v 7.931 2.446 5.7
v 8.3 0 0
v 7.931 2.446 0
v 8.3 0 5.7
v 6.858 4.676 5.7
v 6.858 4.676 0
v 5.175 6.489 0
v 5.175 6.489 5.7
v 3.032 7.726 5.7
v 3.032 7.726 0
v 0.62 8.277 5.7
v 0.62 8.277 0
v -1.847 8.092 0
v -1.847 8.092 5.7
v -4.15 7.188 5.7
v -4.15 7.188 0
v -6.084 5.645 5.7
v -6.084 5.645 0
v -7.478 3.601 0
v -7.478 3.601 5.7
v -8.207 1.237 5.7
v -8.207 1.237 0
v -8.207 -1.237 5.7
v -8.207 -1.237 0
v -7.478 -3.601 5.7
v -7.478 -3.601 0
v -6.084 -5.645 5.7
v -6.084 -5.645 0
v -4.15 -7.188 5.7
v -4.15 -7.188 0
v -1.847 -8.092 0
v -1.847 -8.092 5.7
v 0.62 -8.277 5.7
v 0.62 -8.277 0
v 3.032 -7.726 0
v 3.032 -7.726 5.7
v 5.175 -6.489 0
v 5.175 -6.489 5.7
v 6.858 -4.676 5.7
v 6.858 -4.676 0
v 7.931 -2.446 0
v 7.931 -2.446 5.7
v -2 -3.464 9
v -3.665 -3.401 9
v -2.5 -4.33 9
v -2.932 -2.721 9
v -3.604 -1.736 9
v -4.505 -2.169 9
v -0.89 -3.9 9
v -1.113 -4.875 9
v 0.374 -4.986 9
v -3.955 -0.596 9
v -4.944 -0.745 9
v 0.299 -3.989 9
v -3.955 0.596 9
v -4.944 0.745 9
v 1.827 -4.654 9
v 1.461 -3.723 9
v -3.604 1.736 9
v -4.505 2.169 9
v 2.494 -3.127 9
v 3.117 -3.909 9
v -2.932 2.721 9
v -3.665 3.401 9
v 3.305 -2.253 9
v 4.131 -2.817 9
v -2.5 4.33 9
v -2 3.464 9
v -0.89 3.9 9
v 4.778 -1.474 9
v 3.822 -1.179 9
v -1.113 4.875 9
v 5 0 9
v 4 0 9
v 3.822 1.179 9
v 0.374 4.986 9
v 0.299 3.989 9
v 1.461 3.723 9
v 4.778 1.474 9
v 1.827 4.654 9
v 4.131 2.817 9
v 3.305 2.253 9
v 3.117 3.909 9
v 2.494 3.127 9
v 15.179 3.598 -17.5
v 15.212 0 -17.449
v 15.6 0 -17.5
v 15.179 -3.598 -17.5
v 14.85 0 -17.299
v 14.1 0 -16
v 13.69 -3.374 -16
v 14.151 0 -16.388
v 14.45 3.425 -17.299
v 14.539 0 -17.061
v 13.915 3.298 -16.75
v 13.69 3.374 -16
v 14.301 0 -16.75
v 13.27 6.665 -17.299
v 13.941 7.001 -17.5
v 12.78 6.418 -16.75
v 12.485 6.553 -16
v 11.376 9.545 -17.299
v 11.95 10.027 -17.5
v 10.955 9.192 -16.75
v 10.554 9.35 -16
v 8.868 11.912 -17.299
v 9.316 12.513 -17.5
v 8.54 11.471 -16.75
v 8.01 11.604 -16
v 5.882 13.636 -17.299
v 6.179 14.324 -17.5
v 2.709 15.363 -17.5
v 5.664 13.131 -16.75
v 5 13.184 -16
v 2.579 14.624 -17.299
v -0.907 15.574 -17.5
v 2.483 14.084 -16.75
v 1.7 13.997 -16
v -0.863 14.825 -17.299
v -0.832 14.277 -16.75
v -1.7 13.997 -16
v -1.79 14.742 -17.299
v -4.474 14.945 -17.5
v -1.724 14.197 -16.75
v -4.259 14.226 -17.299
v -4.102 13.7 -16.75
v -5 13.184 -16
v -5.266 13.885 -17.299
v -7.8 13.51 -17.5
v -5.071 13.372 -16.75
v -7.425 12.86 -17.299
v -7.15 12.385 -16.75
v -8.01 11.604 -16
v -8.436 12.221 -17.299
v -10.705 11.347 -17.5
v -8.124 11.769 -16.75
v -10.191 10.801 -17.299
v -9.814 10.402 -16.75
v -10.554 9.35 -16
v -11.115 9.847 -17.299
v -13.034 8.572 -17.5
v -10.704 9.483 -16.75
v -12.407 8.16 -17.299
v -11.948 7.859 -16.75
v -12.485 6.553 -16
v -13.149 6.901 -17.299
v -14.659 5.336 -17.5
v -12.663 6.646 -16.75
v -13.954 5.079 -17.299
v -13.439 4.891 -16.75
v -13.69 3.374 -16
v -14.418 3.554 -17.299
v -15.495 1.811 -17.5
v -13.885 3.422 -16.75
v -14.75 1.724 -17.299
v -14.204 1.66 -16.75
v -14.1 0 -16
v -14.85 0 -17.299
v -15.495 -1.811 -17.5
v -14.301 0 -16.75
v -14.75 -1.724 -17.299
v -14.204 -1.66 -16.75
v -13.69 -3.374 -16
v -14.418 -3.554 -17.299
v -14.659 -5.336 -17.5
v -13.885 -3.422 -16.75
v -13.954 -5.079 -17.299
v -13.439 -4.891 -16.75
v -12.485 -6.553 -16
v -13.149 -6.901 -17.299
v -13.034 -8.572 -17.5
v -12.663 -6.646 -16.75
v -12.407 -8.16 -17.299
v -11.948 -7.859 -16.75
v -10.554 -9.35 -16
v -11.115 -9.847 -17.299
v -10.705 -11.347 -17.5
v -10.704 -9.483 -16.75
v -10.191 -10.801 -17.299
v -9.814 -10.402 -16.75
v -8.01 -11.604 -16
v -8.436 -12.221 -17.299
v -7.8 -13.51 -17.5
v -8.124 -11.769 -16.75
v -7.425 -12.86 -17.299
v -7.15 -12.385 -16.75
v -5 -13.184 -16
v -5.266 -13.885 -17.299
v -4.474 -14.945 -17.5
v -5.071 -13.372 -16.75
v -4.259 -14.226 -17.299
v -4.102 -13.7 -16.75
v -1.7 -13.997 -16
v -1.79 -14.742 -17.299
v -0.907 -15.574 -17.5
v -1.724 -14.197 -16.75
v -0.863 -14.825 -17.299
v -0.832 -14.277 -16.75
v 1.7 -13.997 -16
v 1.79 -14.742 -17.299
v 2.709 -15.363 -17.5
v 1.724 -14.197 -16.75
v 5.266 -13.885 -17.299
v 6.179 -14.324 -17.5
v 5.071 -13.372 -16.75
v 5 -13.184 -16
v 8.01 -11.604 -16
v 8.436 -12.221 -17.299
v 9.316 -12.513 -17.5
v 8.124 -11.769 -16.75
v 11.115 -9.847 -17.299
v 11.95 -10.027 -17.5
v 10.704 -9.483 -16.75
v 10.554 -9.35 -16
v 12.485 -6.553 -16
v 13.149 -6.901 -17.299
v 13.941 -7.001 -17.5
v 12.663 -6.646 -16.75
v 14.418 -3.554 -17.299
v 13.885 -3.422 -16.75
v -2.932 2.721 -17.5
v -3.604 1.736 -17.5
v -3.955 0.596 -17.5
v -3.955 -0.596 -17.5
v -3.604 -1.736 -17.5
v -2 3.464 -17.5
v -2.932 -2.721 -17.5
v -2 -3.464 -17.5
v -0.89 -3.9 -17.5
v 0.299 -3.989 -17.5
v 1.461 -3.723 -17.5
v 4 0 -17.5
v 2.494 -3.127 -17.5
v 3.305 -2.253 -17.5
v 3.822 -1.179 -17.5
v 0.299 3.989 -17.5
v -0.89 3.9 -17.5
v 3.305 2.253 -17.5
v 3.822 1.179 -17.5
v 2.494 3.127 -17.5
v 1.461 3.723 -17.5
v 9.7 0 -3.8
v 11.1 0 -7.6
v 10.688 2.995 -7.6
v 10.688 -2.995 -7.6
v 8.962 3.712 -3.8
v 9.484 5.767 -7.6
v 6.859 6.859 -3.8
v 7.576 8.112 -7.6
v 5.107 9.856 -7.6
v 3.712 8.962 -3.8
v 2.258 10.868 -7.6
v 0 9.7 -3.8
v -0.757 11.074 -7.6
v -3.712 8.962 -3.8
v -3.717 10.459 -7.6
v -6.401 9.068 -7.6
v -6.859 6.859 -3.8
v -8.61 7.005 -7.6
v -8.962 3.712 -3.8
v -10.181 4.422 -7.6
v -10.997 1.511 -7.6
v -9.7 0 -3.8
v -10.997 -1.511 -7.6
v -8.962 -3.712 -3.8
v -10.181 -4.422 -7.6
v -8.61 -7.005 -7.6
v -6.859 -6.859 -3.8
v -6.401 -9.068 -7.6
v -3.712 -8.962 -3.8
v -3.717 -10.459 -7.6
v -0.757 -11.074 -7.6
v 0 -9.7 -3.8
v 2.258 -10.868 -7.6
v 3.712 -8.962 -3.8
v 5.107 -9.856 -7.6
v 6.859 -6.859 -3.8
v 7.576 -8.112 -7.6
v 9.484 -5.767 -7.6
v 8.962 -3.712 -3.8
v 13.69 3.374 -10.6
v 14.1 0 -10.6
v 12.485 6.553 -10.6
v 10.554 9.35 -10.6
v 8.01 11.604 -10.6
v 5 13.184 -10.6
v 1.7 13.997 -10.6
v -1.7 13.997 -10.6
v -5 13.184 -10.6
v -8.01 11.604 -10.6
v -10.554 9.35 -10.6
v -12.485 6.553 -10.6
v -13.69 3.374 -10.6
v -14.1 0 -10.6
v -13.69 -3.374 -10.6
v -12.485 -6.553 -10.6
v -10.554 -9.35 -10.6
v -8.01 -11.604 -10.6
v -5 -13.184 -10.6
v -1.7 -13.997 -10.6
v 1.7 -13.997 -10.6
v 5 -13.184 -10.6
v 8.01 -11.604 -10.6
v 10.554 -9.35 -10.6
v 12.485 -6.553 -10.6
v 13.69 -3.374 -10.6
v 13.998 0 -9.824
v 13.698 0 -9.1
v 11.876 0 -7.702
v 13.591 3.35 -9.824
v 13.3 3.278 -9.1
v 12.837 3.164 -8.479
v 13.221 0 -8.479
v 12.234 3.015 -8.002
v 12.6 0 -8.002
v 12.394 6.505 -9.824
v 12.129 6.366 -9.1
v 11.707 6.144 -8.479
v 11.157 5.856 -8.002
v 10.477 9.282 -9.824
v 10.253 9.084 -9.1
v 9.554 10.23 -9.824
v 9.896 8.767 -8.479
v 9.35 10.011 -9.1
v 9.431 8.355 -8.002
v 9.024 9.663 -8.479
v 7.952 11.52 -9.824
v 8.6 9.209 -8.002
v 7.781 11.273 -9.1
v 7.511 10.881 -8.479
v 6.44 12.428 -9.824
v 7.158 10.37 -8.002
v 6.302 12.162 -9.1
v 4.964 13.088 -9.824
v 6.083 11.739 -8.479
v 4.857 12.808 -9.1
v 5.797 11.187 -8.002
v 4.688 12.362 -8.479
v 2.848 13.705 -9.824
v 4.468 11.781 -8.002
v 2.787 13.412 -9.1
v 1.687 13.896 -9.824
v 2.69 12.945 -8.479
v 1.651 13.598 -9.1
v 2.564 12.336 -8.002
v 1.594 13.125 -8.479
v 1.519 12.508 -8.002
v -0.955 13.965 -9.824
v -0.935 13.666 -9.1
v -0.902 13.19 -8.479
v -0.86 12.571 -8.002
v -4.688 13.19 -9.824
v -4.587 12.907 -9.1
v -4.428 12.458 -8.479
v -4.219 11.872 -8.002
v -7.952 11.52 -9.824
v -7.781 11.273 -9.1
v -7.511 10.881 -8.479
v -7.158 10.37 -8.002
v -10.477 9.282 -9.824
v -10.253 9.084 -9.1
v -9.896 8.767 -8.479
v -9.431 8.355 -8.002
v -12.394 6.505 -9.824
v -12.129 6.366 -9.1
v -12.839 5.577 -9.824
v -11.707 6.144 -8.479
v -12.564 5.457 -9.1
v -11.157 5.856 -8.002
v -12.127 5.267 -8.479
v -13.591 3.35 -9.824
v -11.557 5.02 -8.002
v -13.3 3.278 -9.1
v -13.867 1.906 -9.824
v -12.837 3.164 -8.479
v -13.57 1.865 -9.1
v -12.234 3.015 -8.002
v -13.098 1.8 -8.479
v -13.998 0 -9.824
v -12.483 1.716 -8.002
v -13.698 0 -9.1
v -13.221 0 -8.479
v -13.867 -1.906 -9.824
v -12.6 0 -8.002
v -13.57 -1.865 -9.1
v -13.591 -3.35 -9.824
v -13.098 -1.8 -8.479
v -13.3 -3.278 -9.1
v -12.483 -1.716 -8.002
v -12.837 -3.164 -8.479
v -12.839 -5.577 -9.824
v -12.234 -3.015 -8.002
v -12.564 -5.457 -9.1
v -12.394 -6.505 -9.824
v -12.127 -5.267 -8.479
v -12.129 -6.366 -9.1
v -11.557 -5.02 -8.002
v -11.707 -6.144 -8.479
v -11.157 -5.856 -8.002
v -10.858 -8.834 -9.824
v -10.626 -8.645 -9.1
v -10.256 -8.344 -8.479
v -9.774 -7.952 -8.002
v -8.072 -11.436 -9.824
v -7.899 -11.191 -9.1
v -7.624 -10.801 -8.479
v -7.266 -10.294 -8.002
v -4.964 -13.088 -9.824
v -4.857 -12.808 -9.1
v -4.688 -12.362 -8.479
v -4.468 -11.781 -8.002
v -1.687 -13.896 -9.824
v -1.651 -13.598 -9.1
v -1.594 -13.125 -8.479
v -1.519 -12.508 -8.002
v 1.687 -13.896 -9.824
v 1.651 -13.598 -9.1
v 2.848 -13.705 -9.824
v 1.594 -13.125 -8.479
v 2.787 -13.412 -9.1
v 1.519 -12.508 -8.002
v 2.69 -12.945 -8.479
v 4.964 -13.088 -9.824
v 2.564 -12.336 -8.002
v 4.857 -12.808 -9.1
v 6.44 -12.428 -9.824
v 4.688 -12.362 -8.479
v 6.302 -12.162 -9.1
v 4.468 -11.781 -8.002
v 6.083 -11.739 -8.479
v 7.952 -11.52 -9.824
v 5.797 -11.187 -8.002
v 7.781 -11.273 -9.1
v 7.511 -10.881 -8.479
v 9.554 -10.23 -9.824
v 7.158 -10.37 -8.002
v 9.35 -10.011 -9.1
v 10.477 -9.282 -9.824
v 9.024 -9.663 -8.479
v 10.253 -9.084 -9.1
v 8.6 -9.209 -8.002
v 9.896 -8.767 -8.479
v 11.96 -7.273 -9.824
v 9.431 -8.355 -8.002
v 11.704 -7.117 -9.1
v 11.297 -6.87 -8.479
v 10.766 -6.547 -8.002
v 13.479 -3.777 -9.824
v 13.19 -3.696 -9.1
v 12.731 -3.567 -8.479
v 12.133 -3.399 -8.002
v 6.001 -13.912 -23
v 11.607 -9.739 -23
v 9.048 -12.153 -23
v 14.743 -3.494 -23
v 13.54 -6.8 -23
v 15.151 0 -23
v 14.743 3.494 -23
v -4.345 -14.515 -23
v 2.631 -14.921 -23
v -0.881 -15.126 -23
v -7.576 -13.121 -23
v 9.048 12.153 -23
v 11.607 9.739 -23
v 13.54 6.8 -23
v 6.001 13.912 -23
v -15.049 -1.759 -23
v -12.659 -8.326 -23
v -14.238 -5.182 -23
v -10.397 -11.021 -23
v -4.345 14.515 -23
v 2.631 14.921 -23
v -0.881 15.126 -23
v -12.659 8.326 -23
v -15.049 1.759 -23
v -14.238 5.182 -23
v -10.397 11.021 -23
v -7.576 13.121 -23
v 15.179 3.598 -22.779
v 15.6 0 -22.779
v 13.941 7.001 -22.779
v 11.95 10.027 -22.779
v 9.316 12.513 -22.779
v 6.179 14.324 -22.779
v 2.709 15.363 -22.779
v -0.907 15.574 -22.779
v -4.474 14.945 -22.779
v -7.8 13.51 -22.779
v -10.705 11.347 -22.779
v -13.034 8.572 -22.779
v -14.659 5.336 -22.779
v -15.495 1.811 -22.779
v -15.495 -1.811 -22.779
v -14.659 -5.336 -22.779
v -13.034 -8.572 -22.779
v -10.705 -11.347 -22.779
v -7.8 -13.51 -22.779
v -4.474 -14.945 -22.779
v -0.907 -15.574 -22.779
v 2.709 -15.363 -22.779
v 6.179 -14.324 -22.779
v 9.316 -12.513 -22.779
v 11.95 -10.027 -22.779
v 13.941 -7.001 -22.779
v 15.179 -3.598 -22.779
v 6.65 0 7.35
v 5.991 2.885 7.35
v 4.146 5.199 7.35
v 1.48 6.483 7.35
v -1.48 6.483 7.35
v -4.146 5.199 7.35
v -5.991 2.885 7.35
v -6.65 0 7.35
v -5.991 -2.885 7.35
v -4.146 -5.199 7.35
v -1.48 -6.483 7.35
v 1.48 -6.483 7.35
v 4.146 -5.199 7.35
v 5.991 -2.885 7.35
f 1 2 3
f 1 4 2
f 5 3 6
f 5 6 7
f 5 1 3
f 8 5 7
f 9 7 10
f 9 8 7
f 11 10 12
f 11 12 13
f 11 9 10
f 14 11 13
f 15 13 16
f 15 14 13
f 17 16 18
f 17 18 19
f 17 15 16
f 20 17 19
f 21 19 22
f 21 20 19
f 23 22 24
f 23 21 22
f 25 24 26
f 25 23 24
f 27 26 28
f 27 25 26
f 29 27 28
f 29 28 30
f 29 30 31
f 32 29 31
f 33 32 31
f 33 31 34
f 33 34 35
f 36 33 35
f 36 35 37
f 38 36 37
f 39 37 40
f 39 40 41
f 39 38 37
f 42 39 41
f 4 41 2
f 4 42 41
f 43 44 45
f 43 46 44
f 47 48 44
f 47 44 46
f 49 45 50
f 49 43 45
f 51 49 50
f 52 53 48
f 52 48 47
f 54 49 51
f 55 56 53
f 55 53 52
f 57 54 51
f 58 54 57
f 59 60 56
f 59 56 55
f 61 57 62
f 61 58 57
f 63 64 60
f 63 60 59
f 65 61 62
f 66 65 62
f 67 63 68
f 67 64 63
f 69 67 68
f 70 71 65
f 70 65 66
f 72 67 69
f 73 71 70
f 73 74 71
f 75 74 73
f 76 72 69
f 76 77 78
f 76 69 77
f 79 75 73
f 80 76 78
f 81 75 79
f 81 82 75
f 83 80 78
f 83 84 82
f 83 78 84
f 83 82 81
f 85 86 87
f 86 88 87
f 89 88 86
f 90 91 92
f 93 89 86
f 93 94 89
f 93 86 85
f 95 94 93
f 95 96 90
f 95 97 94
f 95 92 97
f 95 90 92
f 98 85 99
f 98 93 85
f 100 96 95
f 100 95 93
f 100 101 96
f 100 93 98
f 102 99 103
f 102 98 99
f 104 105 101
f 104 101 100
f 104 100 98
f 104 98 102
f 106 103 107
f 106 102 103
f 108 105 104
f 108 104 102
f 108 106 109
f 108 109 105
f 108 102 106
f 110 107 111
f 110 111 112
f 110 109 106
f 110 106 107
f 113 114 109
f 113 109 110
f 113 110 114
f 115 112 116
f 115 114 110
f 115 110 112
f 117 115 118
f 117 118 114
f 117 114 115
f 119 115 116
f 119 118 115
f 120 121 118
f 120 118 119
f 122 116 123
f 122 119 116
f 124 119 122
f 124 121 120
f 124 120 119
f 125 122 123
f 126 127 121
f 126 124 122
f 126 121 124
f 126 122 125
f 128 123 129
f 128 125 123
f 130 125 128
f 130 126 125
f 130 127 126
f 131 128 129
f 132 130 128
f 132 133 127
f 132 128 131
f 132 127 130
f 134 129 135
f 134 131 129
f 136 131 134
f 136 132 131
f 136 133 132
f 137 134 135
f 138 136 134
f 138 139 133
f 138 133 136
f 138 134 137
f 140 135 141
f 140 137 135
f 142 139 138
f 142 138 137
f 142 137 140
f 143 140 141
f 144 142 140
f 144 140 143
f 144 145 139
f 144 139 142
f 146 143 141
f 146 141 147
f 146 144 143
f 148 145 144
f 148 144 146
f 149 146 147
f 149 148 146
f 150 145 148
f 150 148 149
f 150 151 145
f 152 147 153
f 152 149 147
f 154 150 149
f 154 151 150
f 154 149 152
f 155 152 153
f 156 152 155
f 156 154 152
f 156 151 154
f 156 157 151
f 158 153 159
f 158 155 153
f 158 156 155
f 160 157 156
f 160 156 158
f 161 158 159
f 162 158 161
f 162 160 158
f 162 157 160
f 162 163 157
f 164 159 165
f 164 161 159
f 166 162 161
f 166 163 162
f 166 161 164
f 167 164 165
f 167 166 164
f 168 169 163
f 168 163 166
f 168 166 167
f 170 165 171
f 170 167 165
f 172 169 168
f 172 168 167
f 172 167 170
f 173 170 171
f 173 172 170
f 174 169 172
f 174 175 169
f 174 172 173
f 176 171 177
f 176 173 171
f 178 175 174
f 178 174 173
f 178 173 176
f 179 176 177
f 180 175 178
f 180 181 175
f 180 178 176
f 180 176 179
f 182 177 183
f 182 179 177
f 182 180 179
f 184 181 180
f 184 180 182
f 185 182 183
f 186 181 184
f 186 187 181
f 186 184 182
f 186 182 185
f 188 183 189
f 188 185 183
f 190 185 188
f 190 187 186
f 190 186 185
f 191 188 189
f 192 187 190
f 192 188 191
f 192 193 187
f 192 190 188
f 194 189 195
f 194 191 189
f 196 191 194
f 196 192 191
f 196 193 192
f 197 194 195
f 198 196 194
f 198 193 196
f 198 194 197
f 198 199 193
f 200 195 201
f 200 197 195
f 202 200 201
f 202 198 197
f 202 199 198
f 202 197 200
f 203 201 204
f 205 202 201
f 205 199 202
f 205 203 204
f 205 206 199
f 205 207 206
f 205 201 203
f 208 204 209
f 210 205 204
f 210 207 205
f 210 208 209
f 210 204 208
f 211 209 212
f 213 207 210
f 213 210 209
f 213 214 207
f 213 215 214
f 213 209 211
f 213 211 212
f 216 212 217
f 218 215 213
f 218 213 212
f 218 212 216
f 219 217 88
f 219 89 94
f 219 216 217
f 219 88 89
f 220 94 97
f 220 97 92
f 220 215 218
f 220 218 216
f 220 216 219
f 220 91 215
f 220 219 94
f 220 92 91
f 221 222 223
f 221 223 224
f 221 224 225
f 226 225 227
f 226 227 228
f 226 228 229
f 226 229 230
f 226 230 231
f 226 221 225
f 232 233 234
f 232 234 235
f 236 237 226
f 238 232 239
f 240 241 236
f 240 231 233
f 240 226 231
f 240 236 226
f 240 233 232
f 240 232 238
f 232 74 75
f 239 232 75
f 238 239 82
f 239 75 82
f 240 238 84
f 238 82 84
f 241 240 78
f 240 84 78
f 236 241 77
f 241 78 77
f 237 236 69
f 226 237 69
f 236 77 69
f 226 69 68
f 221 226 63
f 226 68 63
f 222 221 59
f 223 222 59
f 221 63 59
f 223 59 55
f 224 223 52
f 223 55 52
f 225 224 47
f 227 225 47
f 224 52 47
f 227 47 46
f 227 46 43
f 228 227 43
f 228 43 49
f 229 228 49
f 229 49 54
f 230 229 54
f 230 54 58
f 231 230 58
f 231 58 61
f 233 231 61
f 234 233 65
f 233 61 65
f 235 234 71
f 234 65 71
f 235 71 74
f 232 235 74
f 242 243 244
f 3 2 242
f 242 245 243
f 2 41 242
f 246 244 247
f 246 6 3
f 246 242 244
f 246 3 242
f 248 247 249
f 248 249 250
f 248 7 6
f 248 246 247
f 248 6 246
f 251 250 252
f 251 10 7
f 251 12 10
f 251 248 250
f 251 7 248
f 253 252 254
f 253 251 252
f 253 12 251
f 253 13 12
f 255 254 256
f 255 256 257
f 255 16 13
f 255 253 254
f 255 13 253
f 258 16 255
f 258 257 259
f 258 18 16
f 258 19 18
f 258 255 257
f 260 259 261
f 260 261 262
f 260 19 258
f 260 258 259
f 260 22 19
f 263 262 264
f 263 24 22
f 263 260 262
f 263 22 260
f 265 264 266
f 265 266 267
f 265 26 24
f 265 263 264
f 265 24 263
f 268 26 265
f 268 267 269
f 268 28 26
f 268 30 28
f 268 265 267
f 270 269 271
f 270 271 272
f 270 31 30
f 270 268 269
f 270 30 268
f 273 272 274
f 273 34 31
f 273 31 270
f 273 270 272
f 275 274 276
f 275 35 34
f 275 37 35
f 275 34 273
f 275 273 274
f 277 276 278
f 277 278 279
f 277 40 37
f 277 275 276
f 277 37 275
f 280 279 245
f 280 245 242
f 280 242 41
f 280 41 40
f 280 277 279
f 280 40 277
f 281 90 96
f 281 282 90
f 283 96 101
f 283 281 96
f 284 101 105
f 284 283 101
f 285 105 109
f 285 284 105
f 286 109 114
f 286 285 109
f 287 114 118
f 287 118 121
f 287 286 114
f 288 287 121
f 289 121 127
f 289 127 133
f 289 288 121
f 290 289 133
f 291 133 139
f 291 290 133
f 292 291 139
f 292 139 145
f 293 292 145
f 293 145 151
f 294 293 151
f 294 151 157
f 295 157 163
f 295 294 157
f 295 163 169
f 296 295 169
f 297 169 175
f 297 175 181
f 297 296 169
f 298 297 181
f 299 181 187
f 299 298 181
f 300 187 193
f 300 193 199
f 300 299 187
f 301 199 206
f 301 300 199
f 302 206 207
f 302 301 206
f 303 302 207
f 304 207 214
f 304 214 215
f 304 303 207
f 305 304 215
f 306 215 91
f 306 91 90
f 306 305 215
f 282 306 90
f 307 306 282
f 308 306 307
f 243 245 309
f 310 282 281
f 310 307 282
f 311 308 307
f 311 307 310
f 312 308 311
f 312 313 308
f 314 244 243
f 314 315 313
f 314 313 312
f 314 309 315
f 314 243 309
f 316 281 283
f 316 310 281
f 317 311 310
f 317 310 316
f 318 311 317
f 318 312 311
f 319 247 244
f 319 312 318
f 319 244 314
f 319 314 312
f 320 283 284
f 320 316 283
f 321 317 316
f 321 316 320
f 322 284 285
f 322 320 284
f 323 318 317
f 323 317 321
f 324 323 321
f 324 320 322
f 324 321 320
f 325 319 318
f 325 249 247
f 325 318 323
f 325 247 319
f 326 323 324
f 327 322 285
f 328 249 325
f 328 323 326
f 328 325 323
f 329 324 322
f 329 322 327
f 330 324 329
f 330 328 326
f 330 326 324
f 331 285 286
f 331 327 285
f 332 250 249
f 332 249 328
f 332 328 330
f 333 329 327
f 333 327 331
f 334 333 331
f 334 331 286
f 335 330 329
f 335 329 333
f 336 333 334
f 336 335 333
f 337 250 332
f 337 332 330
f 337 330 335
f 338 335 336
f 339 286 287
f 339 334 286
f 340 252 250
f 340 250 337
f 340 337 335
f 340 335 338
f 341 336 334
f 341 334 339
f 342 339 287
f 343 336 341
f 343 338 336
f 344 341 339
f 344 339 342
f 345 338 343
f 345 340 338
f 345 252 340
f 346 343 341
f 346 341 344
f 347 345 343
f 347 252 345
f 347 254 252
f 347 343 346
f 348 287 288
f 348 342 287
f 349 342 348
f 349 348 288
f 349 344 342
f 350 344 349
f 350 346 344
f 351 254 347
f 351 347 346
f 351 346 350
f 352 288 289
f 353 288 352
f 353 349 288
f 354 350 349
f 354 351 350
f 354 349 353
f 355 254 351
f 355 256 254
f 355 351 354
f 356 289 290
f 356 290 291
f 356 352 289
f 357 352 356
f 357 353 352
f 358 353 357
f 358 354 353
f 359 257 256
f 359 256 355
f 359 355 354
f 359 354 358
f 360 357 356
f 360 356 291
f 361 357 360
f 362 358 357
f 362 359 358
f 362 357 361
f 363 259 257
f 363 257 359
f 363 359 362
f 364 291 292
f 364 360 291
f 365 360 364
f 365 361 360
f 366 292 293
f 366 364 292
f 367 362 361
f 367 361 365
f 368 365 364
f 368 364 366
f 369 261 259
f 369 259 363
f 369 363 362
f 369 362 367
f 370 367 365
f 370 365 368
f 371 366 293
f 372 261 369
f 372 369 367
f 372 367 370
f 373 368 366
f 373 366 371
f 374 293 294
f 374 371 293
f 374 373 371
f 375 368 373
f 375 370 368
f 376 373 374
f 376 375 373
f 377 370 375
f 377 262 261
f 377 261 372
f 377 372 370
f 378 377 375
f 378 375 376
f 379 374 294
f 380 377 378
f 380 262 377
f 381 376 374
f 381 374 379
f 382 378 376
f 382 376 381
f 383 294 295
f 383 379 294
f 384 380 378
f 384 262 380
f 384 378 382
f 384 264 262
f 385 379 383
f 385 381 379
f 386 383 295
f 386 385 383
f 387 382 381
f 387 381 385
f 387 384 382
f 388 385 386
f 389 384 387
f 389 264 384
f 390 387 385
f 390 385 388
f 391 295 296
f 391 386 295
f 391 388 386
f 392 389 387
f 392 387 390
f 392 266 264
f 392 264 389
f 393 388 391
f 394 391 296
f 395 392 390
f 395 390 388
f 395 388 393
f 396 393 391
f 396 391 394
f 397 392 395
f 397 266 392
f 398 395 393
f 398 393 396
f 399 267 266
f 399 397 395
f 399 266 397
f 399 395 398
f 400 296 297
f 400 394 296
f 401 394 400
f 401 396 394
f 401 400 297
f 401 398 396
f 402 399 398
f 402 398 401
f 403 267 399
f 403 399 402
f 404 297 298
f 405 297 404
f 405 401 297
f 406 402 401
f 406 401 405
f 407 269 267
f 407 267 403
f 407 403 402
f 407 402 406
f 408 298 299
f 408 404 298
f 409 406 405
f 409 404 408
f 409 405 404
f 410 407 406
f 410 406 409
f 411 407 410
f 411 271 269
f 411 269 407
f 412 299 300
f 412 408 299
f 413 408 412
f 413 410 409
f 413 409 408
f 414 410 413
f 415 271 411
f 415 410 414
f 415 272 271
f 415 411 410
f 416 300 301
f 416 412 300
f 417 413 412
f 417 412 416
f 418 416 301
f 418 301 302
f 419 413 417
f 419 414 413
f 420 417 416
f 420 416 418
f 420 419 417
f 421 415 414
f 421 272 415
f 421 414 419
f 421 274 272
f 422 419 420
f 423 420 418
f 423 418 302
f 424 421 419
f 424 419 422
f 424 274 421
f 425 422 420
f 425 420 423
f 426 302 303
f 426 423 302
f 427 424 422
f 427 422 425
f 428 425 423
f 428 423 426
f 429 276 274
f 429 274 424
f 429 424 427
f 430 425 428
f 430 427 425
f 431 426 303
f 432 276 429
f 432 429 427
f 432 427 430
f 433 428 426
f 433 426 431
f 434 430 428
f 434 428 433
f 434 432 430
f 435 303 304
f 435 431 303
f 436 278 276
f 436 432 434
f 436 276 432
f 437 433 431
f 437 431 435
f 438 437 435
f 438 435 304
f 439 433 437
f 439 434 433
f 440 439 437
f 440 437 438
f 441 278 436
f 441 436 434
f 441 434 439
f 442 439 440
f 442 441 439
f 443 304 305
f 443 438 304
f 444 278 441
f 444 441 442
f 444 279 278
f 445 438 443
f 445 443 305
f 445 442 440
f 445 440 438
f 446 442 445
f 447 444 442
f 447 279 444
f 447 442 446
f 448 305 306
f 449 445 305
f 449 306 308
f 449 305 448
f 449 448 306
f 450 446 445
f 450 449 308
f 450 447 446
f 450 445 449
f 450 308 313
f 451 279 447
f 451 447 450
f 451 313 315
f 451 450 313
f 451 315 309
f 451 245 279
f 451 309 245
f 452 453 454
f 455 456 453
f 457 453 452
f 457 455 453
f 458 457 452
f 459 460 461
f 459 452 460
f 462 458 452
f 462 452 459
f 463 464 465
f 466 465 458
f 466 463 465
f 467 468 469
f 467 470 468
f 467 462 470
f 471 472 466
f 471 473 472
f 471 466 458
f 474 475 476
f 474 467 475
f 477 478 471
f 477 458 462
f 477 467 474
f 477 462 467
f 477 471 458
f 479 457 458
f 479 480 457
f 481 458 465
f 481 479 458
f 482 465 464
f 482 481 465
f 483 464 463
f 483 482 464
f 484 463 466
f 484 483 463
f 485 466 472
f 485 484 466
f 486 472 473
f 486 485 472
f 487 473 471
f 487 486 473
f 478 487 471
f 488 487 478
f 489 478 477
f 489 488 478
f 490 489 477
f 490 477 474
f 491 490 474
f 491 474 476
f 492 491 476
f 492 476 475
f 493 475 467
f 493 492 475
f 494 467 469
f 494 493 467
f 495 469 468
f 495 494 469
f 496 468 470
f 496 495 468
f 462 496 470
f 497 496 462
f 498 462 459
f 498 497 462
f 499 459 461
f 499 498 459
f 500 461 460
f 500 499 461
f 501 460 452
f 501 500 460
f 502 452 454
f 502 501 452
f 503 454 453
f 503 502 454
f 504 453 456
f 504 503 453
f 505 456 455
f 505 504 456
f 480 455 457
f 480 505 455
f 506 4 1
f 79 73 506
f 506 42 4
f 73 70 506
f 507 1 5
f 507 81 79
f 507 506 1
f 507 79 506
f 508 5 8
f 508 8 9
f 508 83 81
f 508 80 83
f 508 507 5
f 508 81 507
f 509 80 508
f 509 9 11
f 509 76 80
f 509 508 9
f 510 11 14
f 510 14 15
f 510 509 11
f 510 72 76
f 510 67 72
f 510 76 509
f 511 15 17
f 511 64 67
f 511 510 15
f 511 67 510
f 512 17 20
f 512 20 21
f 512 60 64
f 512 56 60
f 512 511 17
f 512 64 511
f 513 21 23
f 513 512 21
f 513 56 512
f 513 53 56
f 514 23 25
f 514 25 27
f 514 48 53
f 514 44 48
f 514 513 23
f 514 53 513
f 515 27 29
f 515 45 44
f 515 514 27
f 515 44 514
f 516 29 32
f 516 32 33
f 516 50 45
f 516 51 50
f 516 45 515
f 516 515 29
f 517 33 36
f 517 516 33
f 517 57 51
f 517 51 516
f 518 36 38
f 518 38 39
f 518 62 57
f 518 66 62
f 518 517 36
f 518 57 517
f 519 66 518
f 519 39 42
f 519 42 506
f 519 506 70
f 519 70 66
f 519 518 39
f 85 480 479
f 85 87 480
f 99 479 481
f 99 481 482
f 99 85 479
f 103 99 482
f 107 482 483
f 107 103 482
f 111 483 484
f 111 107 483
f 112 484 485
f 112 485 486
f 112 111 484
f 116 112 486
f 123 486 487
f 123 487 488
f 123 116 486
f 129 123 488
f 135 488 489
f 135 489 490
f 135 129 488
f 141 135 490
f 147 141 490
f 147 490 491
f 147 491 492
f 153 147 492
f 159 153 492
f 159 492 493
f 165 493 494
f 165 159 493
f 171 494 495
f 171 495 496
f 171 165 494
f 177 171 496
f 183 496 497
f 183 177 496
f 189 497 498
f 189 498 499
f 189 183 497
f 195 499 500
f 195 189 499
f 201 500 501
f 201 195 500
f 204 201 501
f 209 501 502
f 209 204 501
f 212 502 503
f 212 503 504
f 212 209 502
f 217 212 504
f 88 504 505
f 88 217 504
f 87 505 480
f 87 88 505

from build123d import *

# Parameters (mm, degrees)
F2_R     = 4
F3_DEPTH = 26.5


with BuildPart() as f1:
    # F0 (on Front) → F1 (revolve)
    with BuildSketch(Plane.XZ):
        with BuildLine():
            Line((0, 9), (0, -23))
            Line((0, -23), (15.151307, -23))
            Line((15.151307, -23), (15.6, -22.779377))
            Line((15.6, -22.779377), (15.6, -17.5))
            ThreePointArc((15.6, -17.5), (14.53934, -17.06066), (14.1, -16))
            Line((14.1, -16), (14.1, -10.6))
            ThreePointArc((14.1, -10.6), (13.22132, -8.47868), (11.1, -7.6))
            Line((11.1, -7.6), (8.3, 0))
            Line((8.3, 0), (8.3, 5.7))
            Line((8.3, 5.7), (5, 9))
            Line((5, 9), (0, 9))
        make_face()
    revolve(axis=Axis((0, 0, -1.903735), (0, 0, 1)))

    # F2 (on face) → F3 (cut)
    with BuildSketch(Plane.XY.offset(9)):
        Circle(F2_R)
    extrude(amount=-F3_DEPTH, mode=Mode.SUBTRACT)


solid = f1.part
